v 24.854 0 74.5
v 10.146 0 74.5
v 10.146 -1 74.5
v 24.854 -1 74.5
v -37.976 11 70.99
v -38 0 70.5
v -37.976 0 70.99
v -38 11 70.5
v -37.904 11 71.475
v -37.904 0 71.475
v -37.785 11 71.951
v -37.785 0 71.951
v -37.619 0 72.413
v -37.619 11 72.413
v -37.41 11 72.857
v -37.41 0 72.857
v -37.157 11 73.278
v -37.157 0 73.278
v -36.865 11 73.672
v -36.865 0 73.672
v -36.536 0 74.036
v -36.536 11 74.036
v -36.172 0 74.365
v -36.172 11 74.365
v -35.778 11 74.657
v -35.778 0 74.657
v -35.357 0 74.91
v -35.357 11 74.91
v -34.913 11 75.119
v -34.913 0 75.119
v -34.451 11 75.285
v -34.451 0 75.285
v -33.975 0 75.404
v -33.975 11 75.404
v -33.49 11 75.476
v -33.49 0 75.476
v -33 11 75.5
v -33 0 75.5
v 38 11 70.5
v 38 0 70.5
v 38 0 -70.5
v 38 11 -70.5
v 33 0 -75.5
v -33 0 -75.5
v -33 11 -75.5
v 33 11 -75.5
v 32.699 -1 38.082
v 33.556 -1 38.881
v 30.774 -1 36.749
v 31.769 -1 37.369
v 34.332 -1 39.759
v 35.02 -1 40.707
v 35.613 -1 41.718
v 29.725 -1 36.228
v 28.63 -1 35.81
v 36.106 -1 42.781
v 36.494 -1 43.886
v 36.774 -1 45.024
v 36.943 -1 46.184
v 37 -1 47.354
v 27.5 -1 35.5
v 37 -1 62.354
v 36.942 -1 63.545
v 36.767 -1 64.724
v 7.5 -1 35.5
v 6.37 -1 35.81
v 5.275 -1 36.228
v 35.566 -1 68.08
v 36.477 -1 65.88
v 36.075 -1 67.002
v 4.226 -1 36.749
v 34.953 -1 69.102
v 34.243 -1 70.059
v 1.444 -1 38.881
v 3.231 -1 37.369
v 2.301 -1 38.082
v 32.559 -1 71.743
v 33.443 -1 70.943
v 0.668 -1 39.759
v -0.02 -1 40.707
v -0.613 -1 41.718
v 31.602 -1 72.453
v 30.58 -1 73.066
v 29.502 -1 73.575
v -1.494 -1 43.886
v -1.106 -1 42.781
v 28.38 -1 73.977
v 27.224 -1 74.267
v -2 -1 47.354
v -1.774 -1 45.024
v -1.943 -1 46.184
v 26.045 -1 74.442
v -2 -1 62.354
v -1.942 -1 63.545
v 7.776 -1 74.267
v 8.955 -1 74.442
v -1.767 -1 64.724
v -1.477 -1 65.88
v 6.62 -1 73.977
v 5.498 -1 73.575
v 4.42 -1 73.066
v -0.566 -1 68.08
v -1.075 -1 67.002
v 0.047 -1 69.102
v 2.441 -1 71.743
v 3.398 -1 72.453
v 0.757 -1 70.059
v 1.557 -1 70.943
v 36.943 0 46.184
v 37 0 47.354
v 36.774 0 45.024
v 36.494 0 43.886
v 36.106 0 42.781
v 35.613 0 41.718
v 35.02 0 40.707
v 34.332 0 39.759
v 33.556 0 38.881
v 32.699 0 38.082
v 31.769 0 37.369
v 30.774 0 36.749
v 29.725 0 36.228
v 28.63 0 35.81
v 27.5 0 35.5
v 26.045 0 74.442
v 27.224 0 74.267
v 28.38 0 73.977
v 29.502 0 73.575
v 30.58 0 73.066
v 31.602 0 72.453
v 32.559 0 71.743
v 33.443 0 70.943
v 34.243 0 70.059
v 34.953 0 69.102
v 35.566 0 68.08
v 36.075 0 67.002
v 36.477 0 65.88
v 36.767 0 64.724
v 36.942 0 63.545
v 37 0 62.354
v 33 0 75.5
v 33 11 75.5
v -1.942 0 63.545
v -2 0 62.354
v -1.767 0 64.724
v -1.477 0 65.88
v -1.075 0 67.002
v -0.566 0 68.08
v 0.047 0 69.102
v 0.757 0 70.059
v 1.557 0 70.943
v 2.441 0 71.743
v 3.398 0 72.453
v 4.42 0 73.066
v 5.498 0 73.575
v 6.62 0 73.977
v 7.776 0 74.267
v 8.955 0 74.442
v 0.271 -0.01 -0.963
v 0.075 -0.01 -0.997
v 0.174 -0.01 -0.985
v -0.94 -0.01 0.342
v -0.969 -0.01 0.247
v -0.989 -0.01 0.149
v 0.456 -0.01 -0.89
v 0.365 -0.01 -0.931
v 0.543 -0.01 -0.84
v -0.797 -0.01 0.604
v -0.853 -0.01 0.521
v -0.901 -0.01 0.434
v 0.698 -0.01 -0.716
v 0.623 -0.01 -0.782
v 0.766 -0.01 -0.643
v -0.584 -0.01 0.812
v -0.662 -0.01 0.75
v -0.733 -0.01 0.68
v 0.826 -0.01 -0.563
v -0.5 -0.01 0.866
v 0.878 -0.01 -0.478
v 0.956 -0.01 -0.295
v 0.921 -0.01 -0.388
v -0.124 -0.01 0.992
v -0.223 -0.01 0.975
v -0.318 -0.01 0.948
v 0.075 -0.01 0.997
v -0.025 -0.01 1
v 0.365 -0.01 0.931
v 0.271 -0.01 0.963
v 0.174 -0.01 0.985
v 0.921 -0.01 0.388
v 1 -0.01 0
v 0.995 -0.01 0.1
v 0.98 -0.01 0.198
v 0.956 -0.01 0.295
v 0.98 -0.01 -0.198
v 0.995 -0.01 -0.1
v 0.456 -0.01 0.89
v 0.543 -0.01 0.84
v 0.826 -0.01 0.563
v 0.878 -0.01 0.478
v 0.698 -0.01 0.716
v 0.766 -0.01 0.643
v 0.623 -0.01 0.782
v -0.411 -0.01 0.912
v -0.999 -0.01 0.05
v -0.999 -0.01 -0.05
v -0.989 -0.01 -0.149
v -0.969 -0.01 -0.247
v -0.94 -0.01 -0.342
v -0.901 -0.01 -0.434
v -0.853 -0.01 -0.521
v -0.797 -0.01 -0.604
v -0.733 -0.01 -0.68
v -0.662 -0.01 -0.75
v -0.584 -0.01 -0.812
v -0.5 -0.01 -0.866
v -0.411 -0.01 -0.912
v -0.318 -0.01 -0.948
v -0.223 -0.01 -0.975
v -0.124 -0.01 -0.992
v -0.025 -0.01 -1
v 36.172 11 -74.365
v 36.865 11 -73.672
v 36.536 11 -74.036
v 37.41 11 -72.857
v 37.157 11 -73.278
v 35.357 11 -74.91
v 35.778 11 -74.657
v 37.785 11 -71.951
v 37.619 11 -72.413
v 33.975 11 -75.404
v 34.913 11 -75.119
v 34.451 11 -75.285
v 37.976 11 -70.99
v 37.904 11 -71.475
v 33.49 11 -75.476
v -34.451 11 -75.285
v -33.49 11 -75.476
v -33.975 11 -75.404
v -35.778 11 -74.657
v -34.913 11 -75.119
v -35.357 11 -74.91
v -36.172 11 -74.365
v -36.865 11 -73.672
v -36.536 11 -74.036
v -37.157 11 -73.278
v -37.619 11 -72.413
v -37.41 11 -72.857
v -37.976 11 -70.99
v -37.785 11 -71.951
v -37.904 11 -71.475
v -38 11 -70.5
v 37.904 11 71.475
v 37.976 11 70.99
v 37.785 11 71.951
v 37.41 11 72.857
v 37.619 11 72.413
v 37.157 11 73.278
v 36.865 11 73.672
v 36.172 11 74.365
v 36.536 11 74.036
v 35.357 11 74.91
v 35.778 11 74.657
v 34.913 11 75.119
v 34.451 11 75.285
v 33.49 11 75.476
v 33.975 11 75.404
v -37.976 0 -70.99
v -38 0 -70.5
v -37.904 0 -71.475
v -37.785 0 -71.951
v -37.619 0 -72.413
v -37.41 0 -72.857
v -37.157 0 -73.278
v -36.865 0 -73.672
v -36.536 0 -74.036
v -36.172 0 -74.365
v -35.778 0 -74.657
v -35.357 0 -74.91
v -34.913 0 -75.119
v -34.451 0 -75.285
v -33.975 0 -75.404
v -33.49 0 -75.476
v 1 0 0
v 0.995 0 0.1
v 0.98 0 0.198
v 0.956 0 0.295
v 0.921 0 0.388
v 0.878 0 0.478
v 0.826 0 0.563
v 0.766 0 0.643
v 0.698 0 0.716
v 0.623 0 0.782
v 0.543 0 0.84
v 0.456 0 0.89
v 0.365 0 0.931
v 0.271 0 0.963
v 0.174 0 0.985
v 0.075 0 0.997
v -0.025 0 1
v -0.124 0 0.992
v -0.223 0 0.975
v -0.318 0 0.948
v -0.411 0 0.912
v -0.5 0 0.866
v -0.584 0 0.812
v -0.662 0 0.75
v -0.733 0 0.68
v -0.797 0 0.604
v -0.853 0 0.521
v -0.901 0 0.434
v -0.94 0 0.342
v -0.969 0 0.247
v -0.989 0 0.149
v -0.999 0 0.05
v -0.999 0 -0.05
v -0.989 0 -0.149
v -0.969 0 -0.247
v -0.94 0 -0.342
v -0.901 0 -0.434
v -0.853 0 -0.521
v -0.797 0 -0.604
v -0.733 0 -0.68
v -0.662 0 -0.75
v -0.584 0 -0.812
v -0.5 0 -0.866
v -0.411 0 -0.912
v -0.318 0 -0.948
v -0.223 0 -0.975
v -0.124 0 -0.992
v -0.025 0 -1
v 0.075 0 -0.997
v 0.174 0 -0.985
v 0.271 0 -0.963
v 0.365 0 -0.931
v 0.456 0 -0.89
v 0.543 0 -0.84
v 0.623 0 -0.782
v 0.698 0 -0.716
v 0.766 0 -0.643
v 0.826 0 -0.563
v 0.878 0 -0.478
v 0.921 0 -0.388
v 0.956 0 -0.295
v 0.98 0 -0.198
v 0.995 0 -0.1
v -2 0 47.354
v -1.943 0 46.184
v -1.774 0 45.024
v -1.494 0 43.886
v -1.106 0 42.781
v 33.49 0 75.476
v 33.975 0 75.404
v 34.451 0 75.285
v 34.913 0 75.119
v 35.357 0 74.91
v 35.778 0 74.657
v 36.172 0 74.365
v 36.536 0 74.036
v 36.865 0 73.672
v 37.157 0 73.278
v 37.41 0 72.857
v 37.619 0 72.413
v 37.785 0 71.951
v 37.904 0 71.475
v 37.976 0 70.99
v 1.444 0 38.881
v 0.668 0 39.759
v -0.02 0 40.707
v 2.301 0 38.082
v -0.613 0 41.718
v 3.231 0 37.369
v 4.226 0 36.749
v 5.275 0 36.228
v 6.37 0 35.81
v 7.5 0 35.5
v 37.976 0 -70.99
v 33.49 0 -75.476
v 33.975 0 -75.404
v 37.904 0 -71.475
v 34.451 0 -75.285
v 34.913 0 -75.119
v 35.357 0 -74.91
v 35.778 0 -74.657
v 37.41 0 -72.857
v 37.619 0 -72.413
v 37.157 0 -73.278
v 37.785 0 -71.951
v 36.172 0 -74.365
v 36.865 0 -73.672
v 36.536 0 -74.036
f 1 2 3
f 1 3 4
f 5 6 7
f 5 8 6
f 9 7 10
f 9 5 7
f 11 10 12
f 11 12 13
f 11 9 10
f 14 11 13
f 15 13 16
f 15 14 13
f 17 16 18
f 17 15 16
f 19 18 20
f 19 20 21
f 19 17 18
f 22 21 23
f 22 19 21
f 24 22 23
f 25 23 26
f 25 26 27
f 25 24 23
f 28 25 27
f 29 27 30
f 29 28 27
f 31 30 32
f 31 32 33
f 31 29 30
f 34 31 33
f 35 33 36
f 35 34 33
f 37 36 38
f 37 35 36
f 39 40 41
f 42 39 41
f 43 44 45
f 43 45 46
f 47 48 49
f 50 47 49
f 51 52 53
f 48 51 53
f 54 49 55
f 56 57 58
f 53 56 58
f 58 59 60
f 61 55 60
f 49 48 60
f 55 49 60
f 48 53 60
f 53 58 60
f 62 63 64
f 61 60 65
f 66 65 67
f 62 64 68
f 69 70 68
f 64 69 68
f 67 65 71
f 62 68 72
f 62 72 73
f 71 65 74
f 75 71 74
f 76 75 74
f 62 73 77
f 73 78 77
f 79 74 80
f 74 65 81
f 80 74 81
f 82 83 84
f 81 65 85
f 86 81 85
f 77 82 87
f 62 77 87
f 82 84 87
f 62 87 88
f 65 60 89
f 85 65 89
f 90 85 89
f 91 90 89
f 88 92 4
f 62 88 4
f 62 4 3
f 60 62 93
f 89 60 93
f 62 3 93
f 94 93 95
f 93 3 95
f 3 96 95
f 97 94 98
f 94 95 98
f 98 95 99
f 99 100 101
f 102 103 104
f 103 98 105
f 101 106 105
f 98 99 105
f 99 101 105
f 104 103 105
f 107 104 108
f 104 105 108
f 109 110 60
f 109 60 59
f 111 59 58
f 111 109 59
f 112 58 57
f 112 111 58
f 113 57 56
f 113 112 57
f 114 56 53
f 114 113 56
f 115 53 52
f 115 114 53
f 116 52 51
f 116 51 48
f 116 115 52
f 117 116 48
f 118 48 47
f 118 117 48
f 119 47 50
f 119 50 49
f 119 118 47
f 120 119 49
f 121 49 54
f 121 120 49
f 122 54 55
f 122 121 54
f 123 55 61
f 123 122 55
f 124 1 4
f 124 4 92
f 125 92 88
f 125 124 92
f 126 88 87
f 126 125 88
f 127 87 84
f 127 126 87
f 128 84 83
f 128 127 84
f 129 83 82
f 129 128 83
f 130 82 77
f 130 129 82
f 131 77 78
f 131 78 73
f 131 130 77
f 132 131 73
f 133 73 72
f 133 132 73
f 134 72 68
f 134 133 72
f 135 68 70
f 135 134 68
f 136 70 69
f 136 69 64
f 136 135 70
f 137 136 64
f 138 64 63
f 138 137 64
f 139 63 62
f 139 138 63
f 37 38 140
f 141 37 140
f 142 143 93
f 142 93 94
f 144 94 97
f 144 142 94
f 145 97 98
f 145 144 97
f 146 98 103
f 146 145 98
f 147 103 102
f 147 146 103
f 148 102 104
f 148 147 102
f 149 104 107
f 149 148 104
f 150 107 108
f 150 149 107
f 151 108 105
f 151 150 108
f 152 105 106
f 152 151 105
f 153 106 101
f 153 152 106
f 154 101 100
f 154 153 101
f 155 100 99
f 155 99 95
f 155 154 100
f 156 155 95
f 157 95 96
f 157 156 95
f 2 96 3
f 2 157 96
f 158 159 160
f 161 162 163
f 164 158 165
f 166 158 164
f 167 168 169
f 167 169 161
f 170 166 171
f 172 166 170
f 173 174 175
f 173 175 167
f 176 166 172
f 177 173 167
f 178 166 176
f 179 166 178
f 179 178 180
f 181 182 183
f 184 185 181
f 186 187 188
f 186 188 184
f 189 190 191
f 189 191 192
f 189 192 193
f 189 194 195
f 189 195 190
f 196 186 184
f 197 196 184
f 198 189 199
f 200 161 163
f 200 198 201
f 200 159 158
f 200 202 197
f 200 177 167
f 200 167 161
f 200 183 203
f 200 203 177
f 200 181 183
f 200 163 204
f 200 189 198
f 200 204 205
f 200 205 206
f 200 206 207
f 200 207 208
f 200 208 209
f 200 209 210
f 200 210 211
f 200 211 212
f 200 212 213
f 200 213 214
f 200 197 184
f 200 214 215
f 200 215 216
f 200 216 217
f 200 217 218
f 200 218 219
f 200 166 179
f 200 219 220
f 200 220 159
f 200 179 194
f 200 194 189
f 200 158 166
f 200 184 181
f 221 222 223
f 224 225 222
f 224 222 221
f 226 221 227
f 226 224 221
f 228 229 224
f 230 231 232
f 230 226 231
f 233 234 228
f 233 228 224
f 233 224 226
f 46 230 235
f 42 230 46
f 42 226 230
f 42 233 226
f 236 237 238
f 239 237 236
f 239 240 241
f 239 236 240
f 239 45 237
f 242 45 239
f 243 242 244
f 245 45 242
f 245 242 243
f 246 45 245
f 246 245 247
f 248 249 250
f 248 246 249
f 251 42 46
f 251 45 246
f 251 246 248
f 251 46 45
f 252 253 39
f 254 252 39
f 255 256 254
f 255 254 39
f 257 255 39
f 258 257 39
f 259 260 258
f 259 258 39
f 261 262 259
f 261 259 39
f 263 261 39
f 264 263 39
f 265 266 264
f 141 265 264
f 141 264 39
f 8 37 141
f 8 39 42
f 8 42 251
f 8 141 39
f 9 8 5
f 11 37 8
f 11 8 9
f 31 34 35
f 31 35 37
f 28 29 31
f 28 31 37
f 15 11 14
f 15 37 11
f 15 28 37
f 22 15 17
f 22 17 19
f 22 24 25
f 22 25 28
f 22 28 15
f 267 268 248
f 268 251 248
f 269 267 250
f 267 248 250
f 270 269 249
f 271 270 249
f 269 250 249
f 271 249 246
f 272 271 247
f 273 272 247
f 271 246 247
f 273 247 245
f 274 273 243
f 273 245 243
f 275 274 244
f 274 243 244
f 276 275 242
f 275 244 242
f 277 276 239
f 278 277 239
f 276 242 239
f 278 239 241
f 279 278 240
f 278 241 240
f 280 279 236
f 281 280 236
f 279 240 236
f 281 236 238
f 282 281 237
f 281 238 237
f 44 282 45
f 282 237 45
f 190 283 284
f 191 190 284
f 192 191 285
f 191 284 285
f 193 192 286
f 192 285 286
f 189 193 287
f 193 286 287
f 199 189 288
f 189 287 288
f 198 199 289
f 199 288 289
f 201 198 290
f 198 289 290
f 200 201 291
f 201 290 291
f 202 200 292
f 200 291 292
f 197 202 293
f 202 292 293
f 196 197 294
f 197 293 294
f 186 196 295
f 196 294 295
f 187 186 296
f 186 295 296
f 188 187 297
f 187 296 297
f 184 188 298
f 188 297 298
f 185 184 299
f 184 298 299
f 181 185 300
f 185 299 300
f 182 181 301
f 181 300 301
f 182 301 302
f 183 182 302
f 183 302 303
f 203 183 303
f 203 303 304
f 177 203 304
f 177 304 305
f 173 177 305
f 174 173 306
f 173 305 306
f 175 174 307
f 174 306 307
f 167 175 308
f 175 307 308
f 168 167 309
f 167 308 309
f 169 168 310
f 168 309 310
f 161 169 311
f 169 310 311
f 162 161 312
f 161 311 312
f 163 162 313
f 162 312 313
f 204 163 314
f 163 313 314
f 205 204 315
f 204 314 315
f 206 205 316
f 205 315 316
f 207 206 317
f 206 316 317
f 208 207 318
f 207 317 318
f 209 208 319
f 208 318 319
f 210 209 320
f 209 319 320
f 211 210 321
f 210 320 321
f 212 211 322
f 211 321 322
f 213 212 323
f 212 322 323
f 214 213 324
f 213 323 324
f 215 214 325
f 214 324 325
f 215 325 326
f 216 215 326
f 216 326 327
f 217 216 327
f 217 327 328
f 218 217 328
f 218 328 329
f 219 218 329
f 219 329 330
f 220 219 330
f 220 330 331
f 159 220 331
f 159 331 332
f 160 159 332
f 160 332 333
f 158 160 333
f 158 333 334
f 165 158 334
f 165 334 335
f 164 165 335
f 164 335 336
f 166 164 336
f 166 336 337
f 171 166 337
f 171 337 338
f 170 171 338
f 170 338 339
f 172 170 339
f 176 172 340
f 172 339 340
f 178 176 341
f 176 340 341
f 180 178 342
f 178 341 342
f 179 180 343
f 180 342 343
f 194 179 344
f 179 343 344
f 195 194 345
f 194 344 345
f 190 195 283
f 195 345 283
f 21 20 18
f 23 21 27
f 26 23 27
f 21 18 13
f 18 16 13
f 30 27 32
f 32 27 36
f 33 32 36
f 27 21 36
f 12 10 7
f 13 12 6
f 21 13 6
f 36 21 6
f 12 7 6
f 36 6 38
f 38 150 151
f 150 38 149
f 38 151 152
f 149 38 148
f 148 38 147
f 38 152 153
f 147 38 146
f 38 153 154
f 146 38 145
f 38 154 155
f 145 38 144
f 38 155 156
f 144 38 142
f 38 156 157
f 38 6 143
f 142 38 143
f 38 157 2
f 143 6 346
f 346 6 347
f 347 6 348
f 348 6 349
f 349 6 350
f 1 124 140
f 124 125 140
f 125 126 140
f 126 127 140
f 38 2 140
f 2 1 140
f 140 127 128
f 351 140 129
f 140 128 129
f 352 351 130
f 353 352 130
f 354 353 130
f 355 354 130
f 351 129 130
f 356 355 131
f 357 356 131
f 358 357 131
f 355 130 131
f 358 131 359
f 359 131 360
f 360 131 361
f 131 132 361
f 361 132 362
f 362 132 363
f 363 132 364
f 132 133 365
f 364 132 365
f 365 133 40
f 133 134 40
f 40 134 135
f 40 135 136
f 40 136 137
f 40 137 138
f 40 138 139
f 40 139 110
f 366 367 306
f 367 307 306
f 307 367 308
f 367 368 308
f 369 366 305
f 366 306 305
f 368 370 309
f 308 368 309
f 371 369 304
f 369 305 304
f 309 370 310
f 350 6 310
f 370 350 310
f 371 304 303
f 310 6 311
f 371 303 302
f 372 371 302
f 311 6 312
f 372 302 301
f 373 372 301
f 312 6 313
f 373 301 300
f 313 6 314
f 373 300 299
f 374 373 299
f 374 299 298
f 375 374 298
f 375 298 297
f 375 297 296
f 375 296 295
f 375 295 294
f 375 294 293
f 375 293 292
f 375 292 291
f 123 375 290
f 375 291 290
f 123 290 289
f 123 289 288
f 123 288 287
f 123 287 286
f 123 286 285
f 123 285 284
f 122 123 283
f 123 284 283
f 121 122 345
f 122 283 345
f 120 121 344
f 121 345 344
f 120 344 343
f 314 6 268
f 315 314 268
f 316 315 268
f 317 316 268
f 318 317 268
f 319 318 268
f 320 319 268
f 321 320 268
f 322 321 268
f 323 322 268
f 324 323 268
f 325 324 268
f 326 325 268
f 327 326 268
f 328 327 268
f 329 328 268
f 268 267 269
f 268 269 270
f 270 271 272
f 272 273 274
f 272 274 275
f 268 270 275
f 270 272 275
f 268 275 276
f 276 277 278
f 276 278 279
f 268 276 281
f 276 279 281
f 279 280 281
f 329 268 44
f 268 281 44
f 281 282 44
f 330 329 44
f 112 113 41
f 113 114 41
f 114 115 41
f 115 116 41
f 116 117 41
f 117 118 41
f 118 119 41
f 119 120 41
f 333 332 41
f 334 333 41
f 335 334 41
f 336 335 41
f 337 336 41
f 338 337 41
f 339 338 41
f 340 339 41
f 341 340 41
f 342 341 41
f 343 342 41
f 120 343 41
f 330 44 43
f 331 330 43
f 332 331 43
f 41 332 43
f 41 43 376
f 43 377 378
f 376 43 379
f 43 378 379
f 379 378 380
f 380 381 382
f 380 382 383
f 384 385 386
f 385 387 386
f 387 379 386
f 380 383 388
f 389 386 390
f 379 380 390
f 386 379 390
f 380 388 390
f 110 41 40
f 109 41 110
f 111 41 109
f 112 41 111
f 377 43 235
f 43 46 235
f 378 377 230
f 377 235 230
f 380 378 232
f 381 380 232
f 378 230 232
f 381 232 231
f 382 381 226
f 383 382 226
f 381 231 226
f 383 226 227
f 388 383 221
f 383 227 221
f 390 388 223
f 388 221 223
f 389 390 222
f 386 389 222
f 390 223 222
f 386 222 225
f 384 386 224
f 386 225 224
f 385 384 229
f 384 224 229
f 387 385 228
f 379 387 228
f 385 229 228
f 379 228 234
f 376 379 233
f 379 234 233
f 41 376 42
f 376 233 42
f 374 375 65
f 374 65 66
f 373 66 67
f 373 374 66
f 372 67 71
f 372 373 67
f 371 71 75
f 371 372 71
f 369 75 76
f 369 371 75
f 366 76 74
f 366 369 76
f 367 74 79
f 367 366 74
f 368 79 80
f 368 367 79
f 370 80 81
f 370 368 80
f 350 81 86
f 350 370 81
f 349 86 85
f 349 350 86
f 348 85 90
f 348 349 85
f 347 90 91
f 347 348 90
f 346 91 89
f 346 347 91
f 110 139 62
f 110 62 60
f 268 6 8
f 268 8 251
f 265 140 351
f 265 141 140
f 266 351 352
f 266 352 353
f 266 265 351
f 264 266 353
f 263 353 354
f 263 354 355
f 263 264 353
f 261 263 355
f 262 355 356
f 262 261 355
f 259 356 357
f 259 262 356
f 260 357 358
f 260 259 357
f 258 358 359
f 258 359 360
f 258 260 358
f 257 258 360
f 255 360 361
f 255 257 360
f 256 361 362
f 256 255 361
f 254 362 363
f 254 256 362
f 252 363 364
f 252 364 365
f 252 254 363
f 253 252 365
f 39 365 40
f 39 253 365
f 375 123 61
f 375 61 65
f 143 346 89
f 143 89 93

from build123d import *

# Parameters (mm, degrees)
SKETCH_1_W       = 76
SKETCH_1_H       = 151
EXTRUDE_1_DEPTH  = 11
EXTRUDE_START    = -11
EXTRUDE_2_DEPTH  = 12
FILLET_1_R       = 5
WRAP_1_OUTLINE_R = 1
WRAP_1_DEPTH     = 0.01


# Read off the part's stored shape, not the designer's step: 包覆1
with BuildPart() as part:
    # 草图1 → 凸台-拉伸1 (new body)
    with BuildSketch(Plane(origin=(0, 0, 0), x_dir=(1, 0, 0), z_dir=(0, 1, 0))):
        Rectangle(SKETCH_1_W, SKETCH_1_H)
    extrude(amount=EXTRUDE_1_DEPTH)

    # 草图2 → 凸台-拉伸2 (add)
    with BuildSketch(Plane.XZ.offset(EXTRUDE_START)):
        with BuildLine():
            Line((10.145843496, 74.5), (24.854156504, 74.5))
            ThreePointArc((24.854156504, 74.5), (33.442564803, 70.942564803), (37, 62.354156504))
            Line((37, 62.354156504), (37, 47.354156504))
            ThreePointArc((37, 47.354156504), (34.331959922, 39.7585817), (27.5, 35.5))
            Line((27.5, 35.5), (7.5, 35.5))
            ThreePointArc((7.5, 35.5), (0.668040078, 39.7585817), (-2, 47.354156504))
            Line((-2, 47.354156504), (-2, 62.354156504))
            ThreePointArc((-2, 62.354156504), (1.557435197, 70.942564803), (10.145843496, 74.5))
        make_face()
    extrude(amount=EXTRUDE_2_DEPTH)

    # 圆角1
    fillet_1_edges = [part.edges().sort_by_distance(p)[0] for p in [
        (38, 5.5, 75.5),
        (-38, 5.5, 75.5),
        (-38, 5.5, -75.5),
        (38, 5.5, -75.5),
    ]]
    fillet(fillet_1_edges, radius=FILLET_1_R)

    # 包覆1 outline → 包覆1 (add)
    with BuildSketch(Plane.XZ):
        Circle(WRAP_1_OUTLINE_R)
    extrude(amount=WRAP_1_DEPTH)


solid = part.part
